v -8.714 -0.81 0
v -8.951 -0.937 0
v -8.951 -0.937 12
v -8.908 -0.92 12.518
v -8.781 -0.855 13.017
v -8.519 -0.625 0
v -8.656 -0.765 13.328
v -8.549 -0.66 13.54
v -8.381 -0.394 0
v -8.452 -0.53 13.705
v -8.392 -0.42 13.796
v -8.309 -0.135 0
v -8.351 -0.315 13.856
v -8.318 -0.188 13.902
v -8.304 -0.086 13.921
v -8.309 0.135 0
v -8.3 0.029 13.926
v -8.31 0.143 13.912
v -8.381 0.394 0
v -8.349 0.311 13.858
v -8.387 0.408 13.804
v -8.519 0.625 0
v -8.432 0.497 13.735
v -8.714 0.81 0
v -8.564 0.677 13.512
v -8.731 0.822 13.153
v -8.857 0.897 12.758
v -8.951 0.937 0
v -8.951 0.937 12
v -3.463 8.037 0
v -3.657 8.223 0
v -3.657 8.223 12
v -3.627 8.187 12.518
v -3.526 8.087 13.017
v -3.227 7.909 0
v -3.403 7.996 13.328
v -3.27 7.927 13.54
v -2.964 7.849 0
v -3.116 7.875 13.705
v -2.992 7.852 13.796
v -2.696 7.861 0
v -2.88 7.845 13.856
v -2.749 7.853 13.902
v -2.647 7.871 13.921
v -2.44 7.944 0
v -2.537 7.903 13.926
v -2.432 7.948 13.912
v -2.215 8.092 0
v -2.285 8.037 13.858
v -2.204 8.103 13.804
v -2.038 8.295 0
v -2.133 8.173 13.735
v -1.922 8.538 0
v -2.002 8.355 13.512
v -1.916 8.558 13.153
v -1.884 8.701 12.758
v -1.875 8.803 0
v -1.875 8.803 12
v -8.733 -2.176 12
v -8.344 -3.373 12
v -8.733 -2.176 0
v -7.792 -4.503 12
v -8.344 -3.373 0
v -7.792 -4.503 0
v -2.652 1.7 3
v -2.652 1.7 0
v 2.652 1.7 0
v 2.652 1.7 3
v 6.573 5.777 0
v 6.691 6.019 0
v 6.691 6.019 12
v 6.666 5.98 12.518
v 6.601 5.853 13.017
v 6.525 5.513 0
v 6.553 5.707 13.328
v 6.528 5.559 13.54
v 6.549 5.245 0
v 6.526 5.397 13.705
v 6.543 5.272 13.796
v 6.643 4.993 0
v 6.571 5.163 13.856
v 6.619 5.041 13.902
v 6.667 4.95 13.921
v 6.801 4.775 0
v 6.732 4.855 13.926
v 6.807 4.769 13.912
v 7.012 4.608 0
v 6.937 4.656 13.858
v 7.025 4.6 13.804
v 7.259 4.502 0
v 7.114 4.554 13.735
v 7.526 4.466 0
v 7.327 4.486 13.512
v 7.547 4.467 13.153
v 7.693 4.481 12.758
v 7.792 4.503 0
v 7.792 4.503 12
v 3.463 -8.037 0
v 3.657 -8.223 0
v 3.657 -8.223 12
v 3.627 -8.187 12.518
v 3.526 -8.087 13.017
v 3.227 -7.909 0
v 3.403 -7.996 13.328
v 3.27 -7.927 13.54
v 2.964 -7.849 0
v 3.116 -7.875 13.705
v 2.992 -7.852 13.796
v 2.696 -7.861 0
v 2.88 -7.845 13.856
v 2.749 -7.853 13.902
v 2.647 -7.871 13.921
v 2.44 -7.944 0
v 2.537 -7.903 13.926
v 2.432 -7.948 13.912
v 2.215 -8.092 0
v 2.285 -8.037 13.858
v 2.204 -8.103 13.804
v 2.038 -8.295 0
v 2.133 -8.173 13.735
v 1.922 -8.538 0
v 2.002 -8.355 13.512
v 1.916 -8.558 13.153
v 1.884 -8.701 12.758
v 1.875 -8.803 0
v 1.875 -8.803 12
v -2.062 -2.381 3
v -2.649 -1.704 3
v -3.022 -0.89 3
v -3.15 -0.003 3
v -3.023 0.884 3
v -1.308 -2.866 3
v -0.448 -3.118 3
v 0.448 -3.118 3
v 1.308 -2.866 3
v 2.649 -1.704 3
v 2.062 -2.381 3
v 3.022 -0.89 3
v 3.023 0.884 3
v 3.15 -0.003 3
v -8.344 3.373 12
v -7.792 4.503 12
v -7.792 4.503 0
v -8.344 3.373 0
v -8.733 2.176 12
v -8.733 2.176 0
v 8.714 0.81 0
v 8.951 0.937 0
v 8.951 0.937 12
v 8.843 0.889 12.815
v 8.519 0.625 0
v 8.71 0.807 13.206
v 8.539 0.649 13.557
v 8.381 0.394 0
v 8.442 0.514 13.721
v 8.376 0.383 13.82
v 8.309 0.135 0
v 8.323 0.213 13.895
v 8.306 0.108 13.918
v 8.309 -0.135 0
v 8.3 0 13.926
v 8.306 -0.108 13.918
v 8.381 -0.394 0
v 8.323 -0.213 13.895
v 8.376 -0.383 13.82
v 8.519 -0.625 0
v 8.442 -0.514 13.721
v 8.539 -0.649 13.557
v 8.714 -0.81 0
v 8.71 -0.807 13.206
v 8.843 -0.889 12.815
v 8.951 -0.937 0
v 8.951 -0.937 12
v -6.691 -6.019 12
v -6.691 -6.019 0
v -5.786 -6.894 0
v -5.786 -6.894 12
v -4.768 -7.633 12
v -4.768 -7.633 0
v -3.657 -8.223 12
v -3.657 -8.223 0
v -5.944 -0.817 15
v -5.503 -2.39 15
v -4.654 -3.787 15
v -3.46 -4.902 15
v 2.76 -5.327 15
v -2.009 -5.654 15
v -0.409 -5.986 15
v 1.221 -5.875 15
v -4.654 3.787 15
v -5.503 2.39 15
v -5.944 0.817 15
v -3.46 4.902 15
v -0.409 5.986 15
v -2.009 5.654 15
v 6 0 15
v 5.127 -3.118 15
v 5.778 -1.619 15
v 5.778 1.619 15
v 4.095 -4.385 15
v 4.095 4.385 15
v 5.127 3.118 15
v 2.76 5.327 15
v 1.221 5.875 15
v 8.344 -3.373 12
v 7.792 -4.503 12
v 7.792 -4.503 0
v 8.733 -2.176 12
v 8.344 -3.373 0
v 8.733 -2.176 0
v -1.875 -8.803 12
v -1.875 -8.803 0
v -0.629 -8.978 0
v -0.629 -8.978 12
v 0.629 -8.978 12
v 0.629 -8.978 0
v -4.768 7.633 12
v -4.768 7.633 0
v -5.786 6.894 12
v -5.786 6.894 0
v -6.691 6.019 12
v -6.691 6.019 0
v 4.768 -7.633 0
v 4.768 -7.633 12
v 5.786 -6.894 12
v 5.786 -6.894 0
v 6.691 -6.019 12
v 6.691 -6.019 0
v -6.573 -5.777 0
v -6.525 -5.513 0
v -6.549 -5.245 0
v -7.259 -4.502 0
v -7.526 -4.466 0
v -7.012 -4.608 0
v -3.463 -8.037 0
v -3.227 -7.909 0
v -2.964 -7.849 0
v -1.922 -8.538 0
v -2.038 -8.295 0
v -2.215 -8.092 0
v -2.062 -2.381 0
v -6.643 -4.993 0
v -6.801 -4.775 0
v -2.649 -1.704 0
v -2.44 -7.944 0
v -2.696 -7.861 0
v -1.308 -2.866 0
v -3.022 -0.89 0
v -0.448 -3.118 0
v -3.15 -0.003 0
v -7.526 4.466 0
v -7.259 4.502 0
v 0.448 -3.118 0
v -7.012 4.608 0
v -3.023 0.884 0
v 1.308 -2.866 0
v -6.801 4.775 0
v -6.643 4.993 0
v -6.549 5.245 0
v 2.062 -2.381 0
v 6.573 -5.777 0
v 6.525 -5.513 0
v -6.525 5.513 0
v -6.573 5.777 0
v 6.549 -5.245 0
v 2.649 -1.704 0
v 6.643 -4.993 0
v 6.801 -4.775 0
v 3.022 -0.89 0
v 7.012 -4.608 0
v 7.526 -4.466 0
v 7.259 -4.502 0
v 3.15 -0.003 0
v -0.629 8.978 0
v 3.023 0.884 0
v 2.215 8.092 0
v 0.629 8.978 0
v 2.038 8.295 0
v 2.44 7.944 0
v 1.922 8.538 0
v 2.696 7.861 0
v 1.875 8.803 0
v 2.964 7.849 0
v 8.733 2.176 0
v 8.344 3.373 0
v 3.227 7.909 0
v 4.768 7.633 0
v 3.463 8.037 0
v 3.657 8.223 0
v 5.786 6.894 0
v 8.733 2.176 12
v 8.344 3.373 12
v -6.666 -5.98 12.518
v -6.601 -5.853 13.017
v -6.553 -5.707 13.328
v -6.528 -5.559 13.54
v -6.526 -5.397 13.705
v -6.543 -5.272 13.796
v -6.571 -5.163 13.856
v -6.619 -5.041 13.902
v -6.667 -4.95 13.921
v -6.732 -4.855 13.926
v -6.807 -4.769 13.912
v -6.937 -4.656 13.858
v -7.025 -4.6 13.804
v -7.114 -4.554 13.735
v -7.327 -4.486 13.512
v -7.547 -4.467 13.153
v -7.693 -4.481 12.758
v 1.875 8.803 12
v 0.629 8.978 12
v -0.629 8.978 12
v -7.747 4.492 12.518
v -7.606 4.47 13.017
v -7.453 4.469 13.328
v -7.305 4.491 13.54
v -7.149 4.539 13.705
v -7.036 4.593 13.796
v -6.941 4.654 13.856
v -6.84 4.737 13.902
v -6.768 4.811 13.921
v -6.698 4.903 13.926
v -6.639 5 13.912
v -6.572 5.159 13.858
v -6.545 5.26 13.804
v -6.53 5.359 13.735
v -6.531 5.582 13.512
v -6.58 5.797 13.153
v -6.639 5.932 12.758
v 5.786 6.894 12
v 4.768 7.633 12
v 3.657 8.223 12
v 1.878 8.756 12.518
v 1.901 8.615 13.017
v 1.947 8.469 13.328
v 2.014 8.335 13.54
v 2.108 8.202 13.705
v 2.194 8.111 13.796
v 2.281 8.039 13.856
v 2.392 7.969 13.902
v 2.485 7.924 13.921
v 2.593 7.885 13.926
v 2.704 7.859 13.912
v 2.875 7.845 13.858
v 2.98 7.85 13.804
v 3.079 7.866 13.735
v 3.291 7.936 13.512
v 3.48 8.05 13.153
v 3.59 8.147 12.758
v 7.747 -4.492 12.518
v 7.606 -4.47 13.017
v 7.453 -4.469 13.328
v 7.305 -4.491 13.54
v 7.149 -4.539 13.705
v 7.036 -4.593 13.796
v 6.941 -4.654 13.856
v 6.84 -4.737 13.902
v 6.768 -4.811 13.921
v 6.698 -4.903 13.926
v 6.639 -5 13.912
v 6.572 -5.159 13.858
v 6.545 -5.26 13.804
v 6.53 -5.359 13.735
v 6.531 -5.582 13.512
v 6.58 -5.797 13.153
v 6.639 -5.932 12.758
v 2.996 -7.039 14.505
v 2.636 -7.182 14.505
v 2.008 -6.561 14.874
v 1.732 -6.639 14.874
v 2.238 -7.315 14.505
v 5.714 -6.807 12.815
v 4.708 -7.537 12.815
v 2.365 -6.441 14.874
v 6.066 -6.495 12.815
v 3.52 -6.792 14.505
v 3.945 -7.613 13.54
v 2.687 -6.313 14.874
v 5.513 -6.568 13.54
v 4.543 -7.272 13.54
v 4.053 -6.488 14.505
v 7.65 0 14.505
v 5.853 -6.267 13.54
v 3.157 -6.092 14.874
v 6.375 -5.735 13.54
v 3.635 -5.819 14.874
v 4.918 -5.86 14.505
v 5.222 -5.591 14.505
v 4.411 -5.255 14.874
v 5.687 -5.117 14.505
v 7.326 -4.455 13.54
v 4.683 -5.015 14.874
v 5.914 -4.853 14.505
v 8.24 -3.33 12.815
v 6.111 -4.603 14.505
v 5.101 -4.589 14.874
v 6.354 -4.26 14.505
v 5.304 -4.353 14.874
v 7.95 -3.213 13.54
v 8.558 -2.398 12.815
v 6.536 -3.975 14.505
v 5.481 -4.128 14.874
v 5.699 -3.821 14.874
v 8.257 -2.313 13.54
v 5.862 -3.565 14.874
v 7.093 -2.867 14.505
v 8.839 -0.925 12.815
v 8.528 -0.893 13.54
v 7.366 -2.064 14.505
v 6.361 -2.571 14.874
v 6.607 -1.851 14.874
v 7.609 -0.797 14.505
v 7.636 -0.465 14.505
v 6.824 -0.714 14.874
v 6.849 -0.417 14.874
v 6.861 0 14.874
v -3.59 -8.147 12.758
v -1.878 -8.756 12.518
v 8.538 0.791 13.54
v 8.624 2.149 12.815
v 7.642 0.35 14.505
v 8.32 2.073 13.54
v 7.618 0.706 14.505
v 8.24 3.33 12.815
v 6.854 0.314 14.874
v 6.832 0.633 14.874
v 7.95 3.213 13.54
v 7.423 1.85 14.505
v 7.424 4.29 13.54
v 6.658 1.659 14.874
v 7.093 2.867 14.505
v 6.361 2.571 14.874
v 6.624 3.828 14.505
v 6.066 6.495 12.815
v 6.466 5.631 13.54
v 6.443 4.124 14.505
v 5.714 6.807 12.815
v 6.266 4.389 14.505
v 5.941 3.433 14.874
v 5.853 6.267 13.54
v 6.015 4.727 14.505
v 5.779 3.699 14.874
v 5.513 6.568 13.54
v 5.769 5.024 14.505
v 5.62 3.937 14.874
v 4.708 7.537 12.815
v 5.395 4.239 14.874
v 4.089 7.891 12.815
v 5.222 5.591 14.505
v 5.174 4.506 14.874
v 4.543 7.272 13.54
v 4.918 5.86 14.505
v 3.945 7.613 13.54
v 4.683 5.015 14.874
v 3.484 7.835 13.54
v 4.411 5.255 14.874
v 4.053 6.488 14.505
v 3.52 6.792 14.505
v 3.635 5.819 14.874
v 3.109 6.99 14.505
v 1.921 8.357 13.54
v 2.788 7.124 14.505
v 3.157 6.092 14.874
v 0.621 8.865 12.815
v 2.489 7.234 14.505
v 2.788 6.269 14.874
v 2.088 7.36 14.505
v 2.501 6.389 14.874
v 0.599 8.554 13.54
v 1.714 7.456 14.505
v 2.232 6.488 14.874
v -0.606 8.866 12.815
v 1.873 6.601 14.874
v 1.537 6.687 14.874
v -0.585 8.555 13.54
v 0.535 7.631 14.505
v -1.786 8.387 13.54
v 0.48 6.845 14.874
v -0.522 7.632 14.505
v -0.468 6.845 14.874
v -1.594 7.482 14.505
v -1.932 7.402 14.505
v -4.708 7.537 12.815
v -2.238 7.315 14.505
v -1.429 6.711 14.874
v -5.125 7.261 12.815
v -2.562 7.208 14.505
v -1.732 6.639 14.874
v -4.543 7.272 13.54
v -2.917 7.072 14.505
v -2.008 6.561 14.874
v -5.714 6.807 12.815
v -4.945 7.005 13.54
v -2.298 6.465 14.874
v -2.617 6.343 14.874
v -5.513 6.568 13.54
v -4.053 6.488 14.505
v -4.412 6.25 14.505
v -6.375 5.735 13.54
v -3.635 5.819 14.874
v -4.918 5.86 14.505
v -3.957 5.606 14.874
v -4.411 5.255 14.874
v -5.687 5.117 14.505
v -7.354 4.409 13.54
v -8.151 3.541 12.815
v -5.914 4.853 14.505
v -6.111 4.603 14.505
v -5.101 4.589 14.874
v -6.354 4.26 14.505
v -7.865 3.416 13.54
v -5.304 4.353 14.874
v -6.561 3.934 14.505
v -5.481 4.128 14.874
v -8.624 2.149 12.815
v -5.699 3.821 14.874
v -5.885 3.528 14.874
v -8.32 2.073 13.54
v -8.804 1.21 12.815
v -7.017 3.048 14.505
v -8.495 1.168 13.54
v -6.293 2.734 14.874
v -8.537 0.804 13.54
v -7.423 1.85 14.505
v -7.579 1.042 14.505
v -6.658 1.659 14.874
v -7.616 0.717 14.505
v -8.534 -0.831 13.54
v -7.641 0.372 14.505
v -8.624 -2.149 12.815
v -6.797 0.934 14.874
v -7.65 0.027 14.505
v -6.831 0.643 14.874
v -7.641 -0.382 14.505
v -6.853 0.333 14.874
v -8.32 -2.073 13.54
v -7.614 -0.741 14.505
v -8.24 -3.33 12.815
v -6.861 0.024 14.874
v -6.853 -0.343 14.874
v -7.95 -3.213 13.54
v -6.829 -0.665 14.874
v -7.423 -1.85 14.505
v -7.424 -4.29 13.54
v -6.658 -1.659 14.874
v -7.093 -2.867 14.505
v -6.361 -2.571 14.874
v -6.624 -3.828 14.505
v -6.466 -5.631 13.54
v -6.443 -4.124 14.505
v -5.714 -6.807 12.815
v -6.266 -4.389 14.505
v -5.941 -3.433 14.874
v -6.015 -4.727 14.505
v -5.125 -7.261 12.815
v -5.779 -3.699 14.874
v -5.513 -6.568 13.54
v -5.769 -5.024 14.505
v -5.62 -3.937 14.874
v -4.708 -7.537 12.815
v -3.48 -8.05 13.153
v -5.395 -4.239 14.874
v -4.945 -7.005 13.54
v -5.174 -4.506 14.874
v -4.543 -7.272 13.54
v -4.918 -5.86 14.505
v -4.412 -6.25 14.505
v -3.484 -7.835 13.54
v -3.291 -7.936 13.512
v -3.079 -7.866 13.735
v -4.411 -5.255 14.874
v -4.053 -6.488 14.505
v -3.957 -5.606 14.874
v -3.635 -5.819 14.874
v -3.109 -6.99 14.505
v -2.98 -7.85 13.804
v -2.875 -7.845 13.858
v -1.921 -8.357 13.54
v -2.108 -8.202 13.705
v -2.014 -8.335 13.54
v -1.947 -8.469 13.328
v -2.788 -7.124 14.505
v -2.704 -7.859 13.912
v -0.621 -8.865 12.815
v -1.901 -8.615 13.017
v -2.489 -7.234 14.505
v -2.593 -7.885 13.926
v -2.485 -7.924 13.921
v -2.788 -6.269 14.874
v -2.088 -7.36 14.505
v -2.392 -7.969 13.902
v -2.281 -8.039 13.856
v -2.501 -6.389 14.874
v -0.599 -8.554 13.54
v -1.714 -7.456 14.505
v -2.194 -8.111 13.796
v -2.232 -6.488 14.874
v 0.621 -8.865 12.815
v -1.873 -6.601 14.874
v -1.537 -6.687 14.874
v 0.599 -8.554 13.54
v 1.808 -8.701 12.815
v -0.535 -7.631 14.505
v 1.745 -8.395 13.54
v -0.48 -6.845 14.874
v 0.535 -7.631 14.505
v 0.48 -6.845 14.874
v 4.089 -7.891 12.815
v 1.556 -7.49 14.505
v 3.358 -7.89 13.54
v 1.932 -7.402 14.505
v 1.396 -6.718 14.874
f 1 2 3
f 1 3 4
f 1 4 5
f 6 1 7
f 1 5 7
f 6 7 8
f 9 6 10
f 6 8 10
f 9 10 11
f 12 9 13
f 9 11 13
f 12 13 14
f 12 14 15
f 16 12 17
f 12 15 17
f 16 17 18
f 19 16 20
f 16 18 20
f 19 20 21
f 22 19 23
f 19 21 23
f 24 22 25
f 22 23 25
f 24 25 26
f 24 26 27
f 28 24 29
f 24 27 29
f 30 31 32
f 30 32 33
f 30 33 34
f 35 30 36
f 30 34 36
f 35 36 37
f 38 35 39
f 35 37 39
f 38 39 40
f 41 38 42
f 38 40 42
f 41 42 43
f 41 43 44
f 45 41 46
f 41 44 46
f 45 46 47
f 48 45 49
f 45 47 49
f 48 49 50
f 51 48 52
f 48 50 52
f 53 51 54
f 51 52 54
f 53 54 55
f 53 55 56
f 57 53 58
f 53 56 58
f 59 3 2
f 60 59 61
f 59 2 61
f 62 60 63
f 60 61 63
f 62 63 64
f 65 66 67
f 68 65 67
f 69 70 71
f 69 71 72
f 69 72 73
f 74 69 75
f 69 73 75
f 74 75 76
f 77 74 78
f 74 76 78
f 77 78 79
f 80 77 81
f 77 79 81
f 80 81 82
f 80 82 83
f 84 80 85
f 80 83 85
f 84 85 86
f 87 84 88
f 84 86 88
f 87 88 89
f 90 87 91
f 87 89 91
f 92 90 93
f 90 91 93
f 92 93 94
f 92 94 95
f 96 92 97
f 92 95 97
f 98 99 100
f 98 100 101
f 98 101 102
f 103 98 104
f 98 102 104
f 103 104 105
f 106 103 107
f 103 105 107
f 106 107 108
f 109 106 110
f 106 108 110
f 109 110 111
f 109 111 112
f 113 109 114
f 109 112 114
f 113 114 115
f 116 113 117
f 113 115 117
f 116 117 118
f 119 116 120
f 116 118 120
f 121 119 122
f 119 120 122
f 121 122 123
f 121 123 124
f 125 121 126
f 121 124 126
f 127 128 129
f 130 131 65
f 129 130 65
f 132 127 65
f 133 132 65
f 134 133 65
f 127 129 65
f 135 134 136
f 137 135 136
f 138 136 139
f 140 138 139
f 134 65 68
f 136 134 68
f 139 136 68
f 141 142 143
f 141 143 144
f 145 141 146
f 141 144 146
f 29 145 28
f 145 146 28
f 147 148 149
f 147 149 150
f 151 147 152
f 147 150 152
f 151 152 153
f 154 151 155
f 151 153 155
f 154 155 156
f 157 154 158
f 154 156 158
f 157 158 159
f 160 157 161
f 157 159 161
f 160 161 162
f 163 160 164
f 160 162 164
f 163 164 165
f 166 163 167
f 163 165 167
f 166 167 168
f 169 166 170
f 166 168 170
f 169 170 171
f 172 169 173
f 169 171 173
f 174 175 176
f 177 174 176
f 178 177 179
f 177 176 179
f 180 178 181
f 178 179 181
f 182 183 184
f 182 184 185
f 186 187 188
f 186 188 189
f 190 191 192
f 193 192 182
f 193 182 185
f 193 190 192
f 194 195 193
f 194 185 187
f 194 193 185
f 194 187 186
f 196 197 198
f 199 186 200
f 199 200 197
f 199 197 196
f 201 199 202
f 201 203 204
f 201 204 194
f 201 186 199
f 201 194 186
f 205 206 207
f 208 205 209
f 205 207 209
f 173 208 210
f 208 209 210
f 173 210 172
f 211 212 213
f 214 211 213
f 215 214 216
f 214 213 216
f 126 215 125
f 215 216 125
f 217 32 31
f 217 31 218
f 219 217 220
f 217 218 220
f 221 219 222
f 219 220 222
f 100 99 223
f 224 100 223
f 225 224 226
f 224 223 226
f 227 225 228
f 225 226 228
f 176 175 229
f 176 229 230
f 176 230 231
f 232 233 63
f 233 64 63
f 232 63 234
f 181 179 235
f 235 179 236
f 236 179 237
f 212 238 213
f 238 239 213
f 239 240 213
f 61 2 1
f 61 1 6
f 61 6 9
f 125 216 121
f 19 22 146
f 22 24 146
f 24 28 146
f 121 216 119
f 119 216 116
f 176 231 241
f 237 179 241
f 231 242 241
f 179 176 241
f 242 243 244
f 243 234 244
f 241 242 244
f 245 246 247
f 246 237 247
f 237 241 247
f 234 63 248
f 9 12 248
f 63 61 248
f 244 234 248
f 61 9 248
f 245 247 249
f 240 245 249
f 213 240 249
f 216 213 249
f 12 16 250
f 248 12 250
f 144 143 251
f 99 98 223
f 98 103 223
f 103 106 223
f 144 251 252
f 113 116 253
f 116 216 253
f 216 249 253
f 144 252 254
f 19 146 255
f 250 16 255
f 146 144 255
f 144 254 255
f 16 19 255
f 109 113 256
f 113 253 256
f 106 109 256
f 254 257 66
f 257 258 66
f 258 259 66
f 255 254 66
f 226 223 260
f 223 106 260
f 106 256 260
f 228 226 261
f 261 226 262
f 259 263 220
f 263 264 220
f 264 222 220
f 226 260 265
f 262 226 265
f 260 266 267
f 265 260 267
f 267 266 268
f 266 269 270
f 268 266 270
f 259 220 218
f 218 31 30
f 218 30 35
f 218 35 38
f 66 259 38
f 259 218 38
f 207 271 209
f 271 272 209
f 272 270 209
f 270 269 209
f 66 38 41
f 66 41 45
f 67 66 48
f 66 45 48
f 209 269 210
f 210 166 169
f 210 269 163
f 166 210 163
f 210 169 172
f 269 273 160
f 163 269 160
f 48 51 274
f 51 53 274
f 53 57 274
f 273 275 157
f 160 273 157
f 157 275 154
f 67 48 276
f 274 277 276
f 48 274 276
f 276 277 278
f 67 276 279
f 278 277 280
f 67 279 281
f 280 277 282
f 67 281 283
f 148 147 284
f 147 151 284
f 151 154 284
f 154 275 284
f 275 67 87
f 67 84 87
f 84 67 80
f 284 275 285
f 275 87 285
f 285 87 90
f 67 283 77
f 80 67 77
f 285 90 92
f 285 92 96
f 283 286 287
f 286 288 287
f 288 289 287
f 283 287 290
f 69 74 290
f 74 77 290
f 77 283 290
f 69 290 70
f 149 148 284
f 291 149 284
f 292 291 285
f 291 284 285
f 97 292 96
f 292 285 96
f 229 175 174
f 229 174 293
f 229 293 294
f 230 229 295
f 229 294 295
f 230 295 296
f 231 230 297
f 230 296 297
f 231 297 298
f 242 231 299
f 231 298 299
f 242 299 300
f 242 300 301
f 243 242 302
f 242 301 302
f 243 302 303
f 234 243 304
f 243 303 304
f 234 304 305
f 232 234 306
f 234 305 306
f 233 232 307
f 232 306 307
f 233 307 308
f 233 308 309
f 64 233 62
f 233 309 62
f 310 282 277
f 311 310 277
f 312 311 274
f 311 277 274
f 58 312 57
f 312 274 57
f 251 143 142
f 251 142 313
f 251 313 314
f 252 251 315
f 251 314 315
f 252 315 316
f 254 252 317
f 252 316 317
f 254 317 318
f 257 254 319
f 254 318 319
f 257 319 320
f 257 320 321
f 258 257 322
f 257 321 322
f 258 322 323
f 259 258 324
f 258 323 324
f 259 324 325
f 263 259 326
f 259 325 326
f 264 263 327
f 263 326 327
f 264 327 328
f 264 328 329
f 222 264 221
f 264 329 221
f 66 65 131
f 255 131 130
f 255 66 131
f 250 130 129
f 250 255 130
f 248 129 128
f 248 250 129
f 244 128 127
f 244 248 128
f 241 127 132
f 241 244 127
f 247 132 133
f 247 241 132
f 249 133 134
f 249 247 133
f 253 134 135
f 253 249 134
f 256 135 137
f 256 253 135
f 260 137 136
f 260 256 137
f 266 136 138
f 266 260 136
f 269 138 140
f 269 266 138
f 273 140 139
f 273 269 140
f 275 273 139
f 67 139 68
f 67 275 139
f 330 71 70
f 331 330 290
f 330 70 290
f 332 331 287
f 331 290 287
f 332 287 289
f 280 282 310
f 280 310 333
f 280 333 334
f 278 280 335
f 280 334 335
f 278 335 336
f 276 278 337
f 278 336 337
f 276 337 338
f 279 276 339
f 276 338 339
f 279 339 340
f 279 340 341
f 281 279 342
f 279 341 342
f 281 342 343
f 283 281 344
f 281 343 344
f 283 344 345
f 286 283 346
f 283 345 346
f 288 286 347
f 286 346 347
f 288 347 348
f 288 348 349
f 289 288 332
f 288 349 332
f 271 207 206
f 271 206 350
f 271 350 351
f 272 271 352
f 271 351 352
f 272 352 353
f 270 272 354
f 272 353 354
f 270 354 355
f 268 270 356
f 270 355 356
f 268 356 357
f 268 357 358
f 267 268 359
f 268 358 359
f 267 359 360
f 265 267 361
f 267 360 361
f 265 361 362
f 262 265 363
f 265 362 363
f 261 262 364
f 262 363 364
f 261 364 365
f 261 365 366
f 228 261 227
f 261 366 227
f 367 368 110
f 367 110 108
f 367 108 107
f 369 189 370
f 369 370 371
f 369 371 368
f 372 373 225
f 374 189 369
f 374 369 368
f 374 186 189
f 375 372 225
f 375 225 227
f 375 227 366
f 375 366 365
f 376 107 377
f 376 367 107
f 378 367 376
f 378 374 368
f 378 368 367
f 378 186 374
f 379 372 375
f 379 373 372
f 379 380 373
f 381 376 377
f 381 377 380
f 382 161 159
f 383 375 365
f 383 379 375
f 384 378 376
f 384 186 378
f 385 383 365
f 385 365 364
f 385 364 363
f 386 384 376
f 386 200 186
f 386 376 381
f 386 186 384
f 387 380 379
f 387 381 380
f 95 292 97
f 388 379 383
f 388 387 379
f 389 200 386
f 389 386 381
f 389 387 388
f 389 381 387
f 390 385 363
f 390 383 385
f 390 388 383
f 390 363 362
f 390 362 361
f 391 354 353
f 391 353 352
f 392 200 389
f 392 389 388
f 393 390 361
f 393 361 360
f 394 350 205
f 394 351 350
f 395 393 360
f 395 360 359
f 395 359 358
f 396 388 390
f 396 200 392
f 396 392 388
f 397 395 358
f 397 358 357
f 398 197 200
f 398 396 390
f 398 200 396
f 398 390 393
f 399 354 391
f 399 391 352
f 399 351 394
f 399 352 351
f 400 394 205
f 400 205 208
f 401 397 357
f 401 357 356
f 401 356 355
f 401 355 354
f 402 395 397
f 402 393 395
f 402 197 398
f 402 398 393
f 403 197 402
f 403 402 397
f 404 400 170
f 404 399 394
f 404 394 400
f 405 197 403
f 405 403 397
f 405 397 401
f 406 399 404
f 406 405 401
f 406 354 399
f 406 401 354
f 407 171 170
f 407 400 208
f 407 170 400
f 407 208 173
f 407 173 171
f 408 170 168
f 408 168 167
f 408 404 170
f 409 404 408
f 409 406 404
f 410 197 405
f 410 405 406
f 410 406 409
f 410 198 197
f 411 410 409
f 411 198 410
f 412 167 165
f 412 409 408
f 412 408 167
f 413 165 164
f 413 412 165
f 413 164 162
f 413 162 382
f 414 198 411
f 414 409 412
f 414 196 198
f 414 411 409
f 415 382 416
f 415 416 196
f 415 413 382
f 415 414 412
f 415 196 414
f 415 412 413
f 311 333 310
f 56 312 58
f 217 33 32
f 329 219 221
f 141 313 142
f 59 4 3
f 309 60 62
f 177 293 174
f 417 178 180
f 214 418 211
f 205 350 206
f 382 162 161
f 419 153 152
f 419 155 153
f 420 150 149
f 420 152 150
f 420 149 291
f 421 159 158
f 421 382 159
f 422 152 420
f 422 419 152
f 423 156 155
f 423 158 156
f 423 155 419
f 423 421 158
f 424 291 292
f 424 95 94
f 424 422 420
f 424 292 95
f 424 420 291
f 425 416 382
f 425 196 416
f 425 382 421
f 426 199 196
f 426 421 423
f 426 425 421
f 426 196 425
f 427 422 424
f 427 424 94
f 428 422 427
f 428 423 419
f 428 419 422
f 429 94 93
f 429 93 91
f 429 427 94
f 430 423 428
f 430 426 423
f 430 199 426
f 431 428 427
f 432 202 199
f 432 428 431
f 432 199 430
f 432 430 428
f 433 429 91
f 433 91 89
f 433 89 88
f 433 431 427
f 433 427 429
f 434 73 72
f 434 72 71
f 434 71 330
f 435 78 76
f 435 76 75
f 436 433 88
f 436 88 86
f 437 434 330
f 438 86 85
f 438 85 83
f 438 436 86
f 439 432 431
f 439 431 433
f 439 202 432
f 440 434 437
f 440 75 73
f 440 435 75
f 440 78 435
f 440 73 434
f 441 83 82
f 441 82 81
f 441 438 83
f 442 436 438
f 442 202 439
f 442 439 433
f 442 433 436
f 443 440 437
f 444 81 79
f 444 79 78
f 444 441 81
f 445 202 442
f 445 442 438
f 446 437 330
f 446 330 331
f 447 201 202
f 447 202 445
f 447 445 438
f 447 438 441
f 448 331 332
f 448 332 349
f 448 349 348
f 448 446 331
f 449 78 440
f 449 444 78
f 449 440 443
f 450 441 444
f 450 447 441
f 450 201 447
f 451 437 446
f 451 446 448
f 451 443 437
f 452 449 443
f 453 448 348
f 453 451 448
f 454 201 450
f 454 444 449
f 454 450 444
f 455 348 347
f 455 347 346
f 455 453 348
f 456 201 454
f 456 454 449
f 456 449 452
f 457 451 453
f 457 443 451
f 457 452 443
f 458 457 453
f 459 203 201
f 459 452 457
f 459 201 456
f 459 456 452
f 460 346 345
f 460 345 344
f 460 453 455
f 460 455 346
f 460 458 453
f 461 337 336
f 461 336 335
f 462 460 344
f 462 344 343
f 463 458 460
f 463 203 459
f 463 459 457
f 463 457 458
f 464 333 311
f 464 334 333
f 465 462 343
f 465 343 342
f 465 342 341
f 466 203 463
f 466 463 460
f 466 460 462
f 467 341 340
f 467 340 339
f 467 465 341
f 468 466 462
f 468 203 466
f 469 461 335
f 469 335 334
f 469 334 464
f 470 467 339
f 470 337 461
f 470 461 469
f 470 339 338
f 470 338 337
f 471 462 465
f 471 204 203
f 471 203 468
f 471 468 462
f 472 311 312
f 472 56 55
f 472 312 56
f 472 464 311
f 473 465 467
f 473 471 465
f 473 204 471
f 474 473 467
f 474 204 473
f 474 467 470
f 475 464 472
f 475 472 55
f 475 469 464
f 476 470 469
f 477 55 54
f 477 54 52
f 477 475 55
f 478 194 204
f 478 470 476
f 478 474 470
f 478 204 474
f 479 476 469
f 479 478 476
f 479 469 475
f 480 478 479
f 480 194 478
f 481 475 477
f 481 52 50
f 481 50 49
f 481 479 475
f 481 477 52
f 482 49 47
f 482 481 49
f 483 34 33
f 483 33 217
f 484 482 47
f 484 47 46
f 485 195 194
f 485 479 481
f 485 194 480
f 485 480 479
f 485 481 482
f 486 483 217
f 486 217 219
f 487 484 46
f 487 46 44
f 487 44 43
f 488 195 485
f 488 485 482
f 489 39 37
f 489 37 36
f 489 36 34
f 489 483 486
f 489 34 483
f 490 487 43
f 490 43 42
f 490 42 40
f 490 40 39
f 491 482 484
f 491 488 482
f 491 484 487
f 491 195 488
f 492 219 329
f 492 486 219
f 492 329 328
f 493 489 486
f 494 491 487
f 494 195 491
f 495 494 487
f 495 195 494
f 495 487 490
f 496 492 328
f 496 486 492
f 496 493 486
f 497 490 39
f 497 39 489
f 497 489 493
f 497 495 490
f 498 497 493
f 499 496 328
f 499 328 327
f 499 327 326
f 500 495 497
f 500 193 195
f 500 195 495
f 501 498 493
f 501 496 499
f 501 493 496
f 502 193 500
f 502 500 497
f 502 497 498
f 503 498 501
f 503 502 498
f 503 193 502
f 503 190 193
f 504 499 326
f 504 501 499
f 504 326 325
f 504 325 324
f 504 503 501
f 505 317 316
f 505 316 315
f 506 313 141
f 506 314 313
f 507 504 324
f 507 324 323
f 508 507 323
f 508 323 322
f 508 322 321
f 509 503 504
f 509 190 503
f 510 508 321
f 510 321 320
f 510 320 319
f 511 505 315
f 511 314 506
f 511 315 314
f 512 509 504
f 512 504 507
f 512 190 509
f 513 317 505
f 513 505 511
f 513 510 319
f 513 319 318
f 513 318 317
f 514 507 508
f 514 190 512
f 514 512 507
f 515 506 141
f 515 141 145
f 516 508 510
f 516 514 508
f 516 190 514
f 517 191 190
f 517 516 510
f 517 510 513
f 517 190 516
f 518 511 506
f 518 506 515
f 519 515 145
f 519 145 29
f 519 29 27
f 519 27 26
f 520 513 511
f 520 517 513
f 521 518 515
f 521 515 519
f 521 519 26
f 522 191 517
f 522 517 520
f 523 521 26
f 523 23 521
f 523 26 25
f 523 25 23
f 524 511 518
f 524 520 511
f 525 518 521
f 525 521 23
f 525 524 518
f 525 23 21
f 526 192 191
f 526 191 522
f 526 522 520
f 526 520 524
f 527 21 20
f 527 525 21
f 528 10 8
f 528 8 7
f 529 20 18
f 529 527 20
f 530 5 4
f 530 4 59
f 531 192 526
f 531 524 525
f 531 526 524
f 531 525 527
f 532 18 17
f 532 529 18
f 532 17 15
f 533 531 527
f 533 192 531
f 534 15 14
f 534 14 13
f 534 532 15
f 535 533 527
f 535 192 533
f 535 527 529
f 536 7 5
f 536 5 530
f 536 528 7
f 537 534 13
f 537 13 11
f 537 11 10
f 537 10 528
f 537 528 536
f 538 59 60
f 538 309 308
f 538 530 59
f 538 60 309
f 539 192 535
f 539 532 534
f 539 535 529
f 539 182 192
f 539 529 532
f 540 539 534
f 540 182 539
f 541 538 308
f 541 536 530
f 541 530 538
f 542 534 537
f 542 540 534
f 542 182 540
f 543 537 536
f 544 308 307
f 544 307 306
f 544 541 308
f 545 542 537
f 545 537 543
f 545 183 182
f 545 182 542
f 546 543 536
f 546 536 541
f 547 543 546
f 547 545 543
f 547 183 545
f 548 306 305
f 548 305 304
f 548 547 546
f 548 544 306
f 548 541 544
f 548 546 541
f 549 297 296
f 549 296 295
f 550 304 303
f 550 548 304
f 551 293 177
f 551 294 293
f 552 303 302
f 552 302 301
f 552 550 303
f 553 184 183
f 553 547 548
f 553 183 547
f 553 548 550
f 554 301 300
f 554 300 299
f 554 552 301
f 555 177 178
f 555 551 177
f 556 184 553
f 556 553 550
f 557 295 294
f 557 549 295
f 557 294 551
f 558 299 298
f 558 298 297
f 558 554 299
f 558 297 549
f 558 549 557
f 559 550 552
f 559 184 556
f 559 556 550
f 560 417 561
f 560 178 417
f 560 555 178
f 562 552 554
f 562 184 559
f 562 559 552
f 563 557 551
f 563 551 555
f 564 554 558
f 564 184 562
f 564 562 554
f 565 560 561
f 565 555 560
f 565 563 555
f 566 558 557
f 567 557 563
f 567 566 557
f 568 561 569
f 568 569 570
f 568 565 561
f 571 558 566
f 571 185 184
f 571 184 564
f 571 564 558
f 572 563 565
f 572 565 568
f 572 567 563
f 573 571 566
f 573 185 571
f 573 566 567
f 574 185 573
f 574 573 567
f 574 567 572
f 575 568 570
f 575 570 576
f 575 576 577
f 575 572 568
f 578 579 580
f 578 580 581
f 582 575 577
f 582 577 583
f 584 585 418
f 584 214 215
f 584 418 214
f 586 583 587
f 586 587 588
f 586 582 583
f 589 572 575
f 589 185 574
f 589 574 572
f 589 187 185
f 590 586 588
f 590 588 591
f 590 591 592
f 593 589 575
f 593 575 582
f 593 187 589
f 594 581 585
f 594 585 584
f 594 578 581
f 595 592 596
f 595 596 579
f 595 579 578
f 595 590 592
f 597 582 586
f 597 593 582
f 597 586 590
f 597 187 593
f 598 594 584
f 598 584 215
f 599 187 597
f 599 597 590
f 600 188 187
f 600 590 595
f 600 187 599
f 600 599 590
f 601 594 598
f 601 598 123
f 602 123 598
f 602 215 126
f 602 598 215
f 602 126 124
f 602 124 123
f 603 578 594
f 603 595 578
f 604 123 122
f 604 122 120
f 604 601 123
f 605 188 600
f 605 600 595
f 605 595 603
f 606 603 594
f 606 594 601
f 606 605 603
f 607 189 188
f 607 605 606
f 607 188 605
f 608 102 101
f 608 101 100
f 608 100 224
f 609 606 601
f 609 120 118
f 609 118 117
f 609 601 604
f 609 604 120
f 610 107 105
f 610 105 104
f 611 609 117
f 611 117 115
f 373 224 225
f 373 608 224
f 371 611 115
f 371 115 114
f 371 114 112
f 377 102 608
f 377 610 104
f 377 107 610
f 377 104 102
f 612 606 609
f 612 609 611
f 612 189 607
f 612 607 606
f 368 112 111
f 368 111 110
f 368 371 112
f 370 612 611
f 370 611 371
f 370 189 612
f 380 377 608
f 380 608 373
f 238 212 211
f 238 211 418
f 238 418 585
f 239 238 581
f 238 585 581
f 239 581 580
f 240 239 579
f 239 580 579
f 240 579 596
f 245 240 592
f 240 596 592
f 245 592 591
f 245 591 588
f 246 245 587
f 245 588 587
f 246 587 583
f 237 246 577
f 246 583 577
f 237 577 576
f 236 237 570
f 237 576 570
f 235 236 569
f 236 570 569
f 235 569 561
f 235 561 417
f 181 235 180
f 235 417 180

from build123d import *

# Parameters (mm, degrees)
SKETCH_R           = 9
SKETCH_R_2         = 3.15
PAD_DEPTH          = 15
SKETCH001_R        = 9
PAD001_DEPTH       = 12
FILLET_R           = 3
SKETCH002_R        = 1
POCKET_DEPTH       = 15
POLARPATTERN_COUNT = 10
SKETCH003_W        = 7.258159
SKETCH003_H        = 2.087937
PAD002_DEPTH       = 10


with BuildPart() as part:
    # Sketch → Pad (new body)
    with BuildSketch(Plane.XY):
        Circle(SKETCH_R)
        Circle(SKETCH_R_2, mode=Mode.SUBTRACT)
    extrude(amount=PAD_DEPTH)

    # Sketch001 (on Face4 of Pad) → Pad001 (join)
    with BuildSketch(Plane.XY.offset(15)):
        Circle(SKETCH001_R)
    extrude(amount=-PAD001_DEPTH)

    # Fillet
    fillet_edges = [part.edges().sort_by_distance(p)[0] for p in [
        (-9, 0, 15),
    ]]
    fillet(fillet_edges, radius=FILLET_R)

    # Sketch002 (on Face6 of Fillet) → Pocket (cut)
    with BuildSketch(Plane.XY.offset(15)):
        with Locations((9.3, 0)):
            Circle(SKETCH002_R)
    pocket = extrude(amount=-POCKET_DEPTH, mode=Mode.SUBTRACT)

    # PolarPattern: Pocket ×10 about axis
    polarpattern_axis = Axis((0, 0, 0), (0, 0, 1))
    for i in range(1, POLARPATTERN_COUNT):
        add(pocket.rotate(polarpattern_axis, i * 360 / POLARPATTERN_COUNT), mode=Mode.SUBTRACT)

    # Sketch003 (on Face8 of PolarPattern) → Pad002 (join)
    with BuildSketch(Plane(origin=(0, 0, 0), x_dir=(1, 0, 0), z_dir=(0, 0, -1))):
        with Locations((0.174419, -2.743968)):
            Rectangle(SKETCH003_W, SKETCH003_H)
    extrude(amount=-PAD002_DEPTH)


solid = part.part
